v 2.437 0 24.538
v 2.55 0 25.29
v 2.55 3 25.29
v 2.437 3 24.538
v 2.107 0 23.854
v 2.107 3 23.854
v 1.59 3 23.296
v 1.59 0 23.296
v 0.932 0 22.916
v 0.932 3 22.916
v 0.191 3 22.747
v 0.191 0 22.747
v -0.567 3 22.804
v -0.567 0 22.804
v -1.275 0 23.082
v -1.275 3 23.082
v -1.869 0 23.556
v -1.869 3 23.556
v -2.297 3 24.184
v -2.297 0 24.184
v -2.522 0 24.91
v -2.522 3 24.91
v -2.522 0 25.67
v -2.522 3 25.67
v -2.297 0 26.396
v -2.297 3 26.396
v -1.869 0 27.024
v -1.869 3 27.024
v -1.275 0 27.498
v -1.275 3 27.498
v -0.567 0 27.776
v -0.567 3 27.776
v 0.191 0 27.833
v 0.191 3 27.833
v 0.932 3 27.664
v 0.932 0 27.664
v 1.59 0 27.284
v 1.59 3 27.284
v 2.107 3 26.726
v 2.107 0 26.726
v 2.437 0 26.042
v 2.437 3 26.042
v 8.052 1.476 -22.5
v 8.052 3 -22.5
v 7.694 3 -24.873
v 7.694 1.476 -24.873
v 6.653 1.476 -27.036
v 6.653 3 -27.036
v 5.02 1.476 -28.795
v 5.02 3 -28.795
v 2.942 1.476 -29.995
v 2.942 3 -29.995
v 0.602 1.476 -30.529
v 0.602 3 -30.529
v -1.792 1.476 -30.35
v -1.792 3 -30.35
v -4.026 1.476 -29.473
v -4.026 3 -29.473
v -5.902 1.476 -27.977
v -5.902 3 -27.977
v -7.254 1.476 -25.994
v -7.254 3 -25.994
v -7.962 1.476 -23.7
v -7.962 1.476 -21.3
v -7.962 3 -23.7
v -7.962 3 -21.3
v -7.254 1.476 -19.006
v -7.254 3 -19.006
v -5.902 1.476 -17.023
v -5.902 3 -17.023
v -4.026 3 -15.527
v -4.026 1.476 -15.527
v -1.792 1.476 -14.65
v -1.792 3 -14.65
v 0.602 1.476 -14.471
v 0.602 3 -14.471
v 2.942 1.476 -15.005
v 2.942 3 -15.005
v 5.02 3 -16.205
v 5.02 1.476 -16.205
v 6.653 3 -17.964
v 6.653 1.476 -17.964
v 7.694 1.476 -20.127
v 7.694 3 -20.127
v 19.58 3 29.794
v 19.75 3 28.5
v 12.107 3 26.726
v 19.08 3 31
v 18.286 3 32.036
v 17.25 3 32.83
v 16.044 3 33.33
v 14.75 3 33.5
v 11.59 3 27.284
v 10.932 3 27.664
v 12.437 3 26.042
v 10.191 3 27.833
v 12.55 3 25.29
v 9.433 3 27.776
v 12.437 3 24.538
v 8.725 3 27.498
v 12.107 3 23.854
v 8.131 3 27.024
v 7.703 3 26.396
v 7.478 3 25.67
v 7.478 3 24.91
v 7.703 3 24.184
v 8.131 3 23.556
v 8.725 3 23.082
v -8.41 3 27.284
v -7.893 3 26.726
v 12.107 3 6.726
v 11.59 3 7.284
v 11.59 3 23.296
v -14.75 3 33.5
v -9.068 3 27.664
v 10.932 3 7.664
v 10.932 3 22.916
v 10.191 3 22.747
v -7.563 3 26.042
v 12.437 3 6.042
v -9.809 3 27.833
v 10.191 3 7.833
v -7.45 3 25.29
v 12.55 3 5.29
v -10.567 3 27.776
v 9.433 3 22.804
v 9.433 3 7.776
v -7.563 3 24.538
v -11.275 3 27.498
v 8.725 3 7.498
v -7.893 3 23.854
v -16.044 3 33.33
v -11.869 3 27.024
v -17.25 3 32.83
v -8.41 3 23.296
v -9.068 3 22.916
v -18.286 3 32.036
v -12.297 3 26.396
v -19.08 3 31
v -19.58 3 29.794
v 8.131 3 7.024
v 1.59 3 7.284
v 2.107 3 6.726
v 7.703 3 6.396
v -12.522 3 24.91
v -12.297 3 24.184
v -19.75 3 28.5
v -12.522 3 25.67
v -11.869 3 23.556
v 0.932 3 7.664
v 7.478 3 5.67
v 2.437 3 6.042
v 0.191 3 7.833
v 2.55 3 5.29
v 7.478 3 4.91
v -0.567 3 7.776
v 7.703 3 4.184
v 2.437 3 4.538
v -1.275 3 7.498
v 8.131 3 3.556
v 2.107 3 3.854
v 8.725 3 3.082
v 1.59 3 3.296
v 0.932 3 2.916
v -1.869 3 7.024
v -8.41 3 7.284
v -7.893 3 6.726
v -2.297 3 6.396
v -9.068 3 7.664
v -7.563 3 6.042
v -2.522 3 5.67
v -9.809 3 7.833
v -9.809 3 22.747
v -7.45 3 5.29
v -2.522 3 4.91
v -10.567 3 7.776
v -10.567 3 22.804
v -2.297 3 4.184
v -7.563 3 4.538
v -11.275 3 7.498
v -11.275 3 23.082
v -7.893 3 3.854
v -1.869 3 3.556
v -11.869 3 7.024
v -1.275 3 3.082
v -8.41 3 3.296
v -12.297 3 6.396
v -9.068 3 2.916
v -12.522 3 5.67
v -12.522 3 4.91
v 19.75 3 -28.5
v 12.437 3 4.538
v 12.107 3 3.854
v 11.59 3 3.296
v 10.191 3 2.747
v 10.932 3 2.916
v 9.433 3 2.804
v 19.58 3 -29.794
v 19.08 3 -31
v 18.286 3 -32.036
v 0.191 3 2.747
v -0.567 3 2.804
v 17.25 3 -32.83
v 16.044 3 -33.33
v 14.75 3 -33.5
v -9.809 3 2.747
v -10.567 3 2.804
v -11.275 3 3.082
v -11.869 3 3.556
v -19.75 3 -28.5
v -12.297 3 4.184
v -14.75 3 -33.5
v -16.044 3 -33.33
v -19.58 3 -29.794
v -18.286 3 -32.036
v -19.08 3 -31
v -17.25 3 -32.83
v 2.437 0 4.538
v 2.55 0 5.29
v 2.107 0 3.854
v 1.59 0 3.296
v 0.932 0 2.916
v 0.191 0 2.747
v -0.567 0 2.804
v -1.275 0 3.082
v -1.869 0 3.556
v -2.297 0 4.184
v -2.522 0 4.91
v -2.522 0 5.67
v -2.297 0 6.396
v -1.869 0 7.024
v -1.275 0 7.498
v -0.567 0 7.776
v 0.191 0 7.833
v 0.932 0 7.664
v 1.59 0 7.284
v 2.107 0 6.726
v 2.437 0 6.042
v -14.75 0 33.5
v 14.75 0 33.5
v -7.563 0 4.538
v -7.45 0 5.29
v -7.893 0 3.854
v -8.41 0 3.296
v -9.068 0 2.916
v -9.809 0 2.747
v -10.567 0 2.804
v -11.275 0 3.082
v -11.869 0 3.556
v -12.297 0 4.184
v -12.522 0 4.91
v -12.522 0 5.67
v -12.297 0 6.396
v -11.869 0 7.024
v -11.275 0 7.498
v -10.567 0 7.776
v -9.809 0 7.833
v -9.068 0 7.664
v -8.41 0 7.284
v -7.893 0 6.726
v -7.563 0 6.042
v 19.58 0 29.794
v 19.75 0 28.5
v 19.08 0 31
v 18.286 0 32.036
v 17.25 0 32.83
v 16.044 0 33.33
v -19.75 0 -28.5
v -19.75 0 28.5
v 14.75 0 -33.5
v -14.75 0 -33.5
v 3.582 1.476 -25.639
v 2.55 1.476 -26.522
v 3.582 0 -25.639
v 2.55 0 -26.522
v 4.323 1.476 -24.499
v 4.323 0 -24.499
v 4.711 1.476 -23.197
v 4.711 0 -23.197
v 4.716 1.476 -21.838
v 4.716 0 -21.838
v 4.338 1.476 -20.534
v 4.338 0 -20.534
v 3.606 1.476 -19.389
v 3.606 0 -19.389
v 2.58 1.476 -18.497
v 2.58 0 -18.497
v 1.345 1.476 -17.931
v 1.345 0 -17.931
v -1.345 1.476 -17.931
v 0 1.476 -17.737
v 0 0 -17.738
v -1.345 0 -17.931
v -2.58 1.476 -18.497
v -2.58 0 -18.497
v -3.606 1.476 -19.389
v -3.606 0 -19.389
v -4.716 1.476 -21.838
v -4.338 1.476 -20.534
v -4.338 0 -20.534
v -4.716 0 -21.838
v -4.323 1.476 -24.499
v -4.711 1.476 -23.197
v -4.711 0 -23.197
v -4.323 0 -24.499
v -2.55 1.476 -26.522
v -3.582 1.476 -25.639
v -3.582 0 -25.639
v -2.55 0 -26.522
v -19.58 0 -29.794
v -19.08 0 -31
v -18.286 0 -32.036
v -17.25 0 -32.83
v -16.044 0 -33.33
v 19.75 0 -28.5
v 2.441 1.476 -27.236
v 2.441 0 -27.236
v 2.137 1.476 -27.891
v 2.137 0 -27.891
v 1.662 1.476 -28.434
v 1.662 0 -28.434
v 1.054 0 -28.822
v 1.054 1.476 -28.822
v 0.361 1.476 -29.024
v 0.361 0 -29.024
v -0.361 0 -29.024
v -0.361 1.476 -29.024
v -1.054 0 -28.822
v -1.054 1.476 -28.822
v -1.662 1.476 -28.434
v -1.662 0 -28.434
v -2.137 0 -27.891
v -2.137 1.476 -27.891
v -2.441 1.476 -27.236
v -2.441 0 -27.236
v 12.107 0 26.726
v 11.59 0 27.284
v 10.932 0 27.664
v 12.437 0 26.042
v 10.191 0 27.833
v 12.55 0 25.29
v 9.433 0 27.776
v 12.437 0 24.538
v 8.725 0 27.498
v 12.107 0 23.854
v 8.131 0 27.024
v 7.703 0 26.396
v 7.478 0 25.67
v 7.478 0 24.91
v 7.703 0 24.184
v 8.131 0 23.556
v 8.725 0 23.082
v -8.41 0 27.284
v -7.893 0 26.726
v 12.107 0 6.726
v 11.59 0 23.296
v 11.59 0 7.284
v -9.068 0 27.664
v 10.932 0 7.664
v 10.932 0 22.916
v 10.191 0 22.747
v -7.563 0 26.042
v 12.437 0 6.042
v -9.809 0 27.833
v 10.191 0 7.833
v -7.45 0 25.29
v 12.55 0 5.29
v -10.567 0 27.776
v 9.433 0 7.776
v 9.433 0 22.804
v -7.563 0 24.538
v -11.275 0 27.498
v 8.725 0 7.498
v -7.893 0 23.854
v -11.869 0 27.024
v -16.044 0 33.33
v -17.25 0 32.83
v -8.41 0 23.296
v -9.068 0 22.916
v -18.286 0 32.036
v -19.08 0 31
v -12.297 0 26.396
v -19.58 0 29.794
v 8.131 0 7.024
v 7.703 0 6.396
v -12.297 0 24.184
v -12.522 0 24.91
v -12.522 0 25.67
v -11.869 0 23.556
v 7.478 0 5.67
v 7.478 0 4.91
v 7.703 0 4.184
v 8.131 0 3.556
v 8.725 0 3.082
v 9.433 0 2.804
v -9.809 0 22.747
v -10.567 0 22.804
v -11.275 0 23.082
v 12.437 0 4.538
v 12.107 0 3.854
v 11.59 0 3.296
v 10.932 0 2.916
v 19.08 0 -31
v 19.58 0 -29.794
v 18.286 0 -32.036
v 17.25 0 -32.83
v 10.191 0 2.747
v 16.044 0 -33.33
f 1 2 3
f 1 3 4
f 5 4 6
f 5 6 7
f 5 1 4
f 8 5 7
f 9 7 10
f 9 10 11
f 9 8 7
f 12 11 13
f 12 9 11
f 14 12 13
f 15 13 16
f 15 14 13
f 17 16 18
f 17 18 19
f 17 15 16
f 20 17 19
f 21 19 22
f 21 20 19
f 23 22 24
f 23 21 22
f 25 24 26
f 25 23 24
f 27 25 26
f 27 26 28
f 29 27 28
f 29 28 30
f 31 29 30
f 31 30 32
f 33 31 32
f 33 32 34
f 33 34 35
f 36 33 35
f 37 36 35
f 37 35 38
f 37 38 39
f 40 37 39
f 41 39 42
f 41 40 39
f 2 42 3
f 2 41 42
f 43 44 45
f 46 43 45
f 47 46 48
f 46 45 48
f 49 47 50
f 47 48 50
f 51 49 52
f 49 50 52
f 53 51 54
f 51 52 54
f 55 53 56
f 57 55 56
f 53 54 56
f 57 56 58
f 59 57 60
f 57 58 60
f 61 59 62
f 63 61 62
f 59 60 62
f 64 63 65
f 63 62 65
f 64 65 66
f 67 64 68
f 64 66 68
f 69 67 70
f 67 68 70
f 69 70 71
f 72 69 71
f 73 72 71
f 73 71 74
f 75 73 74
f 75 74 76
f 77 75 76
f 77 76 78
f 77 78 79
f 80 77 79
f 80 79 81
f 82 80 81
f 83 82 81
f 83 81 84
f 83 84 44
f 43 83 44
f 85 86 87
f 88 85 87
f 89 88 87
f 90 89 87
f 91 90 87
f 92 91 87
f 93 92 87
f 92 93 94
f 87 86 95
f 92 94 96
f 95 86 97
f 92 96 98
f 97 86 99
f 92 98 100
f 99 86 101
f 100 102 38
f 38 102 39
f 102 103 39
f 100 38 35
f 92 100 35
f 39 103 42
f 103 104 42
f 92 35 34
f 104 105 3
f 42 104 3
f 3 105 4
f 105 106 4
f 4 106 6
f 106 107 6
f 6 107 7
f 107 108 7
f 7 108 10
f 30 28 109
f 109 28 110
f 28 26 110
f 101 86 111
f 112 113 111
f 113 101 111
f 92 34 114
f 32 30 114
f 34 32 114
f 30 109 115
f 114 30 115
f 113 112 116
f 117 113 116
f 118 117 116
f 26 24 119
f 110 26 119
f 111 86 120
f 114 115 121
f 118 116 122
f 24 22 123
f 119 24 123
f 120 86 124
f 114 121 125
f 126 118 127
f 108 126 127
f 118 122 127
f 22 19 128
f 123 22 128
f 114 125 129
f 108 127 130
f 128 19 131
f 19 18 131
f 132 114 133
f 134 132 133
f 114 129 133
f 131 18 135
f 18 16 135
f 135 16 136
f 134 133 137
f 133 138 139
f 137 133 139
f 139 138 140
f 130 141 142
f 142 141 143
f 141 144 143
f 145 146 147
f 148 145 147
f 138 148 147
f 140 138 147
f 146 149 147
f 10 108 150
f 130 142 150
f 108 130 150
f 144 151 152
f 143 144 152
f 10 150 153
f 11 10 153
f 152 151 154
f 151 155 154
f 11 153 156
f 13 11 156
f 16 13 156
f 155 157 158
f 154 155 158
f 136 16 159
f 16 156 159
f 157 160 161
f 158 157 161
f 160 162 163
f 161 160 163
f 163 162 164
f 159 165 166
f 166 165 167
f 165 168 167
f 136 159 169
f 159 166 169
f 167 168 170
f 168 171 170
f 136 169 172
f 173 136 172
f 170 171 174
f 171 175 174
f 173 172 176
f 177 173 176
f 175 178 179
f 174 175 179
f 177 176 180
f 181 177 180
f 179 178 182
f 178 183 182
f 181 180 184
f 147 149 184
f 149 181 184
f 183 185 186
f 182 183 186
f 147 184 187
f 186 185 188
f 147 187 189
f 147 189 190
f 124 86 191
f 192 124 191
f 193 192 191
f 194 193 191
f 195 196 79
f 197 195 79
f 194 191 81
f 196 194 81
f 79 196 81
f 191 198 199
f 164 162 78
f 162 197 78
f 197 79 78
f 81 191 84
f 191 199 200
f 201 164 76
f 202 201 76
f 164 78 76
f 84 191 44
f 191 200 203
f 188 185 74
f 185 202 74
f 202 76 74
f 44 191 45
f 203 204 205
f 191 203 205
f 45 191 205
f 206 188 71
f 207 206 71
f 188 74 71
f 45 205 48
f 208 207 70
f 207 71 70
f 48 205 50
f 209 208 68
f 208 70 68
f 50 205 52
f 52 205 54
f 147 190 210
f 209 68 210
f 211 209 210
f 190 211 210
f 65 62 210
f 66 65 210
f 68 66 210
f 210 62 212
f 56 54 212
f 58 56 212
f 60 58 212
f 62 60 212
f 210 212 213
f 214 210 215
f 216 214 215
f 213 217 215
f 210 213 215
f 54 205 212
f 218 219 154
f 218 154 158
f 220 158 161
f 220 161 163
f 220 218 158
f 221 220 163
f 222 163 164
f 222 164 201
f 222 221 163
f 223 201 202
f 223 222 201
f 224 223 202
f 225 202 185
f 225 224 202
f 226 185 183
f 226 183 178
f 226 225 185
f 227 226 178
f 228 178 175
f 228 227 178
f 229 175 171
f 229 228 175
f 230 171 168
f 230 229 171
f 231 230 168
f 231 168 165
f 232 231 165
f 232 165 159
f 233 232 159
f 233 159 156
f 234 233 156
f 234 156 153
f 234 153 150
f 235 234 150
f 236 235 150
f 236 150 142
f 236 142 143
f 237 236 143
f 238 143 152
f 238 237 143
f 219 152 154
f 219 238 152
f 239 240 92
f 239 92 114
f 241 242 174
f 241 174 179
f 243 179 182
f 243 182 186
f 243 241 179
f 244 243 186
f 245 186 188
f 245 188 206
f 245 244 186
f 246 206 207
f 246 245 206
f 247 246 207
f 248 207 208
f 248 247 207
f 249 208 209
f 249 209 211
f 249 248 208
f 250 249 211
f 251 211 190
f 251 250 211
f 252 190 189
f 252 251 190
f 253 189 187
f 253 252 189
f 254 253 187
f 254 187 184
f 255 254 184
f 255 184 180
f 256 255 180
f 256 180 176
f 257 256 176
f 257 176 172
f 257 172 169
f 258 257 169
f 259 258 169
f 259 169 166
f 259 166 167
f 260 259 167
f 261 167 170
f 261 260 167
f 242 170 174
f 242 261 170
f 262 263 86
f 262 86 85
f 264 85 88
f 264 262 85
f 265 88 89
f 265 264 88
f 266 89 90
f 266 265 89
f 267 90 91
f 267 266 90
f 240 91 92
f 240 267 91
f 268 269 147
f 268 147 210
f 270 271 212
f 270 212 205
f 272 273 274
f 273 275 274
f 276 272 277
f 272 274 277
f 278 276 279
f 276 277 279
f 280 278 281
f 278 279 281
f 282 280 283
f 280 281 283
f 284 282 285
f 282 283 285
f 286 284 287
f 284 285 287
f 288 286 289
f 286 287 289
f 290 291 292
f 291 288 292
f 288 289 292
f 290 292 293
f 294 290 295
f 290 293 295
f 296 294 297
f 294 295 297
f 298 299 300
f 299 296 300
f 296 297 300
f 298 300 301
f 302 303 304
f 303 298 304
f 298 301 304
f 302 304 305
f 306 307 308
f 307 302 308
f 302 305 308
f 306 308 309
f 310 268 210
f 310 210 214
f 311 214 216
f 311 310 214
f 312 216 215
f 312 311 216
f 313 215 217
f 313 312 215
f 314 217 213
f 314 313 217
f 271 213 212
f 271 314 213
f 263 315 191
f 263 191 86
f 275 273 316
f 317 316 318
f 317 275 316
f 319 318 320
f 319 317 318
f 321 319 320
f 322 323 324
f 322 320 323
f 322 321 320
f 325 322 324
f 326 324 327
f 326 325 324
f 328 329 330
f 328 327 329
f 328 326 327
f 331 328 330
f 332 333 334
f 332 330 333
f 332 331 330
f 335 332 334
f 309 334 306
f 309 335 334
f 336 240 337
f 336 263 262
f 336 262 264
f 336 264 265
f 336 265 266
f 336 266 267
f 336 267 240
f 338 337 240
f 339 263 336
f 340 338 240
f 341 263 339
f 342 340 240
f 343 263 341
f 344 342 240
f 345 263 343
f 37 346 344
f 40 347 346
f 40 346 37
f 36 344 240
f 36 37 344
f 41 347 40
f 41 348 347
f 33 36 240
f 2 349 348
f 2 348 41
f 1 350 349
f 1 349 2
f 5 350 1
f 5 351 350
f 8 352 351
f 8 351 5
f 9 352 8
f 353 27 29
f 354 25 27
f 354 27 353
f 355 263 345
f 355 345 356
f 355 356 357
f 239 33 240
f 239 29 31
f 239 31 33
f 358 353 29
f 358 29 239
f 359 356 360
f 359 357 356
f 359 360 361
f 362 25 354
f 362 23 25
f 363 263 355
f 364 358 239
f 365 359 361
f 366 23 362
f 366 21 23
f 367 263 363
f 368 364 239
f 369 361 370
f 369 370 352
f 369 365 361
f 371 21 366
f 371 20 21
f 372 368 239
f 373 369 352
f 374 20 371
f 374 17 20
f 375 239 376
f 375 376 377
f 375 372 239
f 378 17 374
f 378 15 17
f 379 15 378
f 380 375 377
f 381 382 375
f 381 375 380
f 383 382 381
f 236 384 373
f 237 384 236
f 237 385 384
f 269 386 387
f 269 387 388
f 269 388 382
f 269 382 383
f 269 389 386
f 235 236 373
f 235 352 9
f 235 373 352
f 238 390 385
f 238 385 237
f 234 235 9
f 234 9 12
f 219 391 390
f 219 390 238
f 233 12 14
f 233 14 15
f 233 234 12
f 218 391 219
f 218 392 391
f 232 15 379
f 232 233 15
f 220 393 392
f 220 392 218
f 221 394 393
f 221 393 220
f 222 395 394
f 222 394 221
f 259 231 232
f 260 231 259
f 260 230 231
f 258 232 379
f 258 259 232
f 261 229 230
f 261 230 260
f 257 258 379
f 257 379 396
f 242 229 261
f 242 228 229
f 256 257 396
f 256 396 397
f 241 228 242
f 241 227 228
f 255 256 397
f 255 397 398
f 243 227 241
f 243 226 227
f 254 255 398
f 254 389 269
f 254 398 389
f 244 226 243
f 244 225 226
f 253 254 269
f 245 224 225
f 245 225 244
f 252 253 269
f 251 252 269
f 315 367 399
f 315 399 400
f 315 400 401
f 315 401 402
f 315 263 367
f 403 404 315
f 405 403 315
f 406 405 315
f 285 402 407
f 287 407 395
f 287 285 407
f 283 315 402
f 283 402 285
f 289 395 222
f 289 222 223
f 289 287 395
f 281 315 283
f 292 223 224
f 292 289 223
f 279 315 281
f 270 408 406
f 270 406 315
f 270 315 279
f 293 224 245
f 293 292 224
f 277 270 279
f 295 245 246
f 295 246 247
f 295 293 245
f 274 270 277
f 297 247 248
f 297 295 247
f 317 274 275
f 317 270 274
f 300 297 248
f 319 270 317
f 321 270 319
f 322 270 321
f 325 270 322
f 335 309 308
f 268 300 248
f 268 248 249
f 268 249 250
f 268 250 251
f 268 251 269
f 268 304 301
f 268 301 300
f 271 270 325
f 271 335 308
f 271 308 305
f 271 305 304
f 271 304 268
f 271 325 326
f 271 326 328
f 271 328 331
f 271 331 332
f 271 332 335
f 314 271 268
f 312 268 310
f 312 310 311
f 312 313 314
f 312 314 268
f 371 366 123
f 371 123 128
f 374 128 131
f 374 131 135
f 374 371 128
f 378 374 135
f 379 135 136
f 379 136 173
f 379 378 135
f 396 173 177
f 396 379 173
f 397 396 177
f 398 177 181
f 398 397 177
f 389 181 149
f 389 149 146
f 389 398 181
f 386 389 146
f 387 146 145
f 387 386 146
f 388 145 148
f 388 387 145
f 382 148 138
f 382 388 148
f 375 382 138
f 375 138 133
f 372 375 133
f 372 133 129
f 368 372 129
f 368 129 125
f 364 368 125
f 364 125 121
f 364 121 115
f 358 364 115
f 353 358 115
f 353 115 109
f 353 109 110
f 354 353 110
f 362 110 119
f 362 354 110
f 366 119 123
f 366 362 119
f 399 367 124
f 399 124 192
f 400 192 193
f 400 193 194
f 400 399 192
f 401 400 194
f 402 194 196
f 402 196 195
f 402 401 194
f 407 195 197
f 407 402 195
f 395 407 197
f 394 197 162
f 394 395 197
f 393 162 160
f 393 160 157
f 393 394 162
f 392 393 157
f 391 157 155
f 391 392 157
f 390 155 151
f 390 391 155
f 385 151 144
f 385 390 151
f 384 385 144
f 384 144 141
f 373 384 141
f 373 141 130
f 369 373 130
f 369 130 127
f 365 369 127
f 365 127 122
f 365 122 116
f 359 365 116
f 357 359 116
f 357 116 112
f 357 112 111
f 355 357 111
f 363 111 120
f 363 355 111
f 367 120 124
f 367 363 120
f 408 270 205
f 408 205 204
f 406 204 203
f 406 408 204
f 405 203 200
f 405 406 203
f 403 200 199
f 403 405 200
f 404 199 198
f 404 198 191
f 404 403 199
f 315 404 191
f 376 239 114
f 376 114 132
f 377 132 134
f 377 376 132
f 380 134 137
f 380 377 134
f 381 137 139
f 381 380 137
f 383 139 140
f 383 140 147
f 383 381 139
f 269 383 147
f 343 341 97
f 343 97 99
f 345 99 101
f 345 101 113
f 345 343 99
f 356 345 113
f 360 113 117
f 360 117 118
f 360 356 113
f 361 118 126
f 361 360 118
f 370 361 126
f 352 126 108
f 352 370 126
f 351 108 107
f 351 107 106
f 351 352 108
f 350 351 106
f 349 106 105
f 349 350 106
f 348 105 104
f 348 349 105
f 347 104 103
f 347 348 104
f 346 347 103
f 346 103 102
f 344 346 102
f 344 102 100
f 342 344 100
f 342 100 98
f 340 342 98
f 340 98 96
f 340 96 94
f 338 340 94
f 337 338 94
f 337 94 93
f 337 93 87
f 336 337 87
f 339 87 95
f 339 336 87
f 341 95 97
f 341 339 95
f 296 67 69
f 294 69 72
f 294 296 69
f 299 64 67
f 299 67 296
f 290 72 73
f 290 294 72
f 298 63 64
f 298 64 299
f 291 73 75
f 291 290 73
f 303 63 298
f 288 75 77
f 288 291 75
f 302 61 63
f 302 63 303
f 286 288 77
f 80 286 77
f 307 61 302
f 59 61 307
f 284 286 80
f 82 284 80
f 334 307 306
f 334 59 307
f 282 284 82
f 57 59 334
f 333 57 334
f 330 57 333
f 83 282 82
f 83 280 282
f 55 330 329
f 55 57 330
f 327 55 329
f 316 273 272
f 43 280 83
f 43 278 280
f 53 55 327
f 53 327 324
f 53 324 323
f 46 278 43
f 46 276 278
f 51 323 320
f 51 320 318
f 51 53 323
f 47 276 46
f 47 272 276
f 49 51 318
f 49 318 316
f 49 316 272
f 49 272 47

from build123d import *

# Parameters (mm, degrees)
SKETCH1_R                                           = 2.55
BOSS_EXTRUDE1_DEPTH                                 = 3
CBORE_FOR_00_BINDING_HEAD_MACHINE_SCREW_D           = 9.525
CBORE_FOR_00_BINDING_HEAD_MACHINE_SCREW_CBORE_D     = 16.1036
CBORE_FOR_00_BINDING_HEAD_MACHINE_SCREW_CBORE_DEPTH = 1.524


with BuildPart() as part:
    # Sketch1 → Boss-Extrude1 (new body)
    with BuildSketch(Plane(origin=(0, 0, 0), x_dir=(1, 0, 0), z_dir=(0, 1, 0))):
        with BuildLine():
            Line((14.75, -33.5), (-14.75, -33.5))
            ThreePointArc((-14.75, -33.5), (-18.285533906, -32.035533906), (-19.75, -28.5))
            Line((-19.75, -28.5), (-19.75, 28.5))
            ThreePointArc((-19.75, 28.5), (-18.285533906, 32.035533906), (-14.75, 33.5))
            Line((-14.75, 33.5), (14.75, 33.5))
            ThreePointArc((14.75, 33.5), (18.285533906, 32.035533906), (19.75, 28.5))
            Line((19.75, 28.5), (19.75, -28.5))
            ThreePointArc((19.75, -28.5), (18.285533906, -32.035533906), (14.75, -33.5))
        make_face()
        with Locations((0, 26.5)):
            Circle(SKETCH1_R, mode=Mode.SUBTRACT)
        with Locations((10, -25.29)):
            Circle(SKETCH1_R, mode=Mode.SUBTRACT)
        with Locations((10, -5.29)):
            Circle(SKETCH1_R, mode=Mode.SUBTRACT)
        with Locations((0, -25.29)):
            Circle(SKETCH1_R, mode=Mode.SUBTRACT)
        with Locations((0, -5.29)):
            Circle(SKETCH1_R, mode=Mode.SUBTRACT)
        with Locations((-10, -25.29)):
            Circle(SKETCH1_R, mode=Mode.SUBTRACT)
        with Locations((-10, -5.29)):
            Circle(SKETCH1_R, mode=Mode.SUBTRACT)
    extrude(amount=BOSS_EXTRUDE1_DEPTH)

    # CBORE for #00 Binding Head Machine Screw1 (through all)
    with Locations(Plane(origin=(0, 3, 0), x_dir=(1, 0, 0), z_dir=(0, 1, 0))):
        with Locations((0, 22.5)):
            CounterBoreHole(CBORE_FOR_00_BINDING_HEAD_MACHINE_SCREW_D / 2, CBORE_FOR_00_BINDING_HEAD_MACHINE_SCREW_CBORE_D / 2, CBORE_FOR_00_BINDING_HEAD_MACHINE_SCREW_CBORE_DEPTH)


solid = part.part
